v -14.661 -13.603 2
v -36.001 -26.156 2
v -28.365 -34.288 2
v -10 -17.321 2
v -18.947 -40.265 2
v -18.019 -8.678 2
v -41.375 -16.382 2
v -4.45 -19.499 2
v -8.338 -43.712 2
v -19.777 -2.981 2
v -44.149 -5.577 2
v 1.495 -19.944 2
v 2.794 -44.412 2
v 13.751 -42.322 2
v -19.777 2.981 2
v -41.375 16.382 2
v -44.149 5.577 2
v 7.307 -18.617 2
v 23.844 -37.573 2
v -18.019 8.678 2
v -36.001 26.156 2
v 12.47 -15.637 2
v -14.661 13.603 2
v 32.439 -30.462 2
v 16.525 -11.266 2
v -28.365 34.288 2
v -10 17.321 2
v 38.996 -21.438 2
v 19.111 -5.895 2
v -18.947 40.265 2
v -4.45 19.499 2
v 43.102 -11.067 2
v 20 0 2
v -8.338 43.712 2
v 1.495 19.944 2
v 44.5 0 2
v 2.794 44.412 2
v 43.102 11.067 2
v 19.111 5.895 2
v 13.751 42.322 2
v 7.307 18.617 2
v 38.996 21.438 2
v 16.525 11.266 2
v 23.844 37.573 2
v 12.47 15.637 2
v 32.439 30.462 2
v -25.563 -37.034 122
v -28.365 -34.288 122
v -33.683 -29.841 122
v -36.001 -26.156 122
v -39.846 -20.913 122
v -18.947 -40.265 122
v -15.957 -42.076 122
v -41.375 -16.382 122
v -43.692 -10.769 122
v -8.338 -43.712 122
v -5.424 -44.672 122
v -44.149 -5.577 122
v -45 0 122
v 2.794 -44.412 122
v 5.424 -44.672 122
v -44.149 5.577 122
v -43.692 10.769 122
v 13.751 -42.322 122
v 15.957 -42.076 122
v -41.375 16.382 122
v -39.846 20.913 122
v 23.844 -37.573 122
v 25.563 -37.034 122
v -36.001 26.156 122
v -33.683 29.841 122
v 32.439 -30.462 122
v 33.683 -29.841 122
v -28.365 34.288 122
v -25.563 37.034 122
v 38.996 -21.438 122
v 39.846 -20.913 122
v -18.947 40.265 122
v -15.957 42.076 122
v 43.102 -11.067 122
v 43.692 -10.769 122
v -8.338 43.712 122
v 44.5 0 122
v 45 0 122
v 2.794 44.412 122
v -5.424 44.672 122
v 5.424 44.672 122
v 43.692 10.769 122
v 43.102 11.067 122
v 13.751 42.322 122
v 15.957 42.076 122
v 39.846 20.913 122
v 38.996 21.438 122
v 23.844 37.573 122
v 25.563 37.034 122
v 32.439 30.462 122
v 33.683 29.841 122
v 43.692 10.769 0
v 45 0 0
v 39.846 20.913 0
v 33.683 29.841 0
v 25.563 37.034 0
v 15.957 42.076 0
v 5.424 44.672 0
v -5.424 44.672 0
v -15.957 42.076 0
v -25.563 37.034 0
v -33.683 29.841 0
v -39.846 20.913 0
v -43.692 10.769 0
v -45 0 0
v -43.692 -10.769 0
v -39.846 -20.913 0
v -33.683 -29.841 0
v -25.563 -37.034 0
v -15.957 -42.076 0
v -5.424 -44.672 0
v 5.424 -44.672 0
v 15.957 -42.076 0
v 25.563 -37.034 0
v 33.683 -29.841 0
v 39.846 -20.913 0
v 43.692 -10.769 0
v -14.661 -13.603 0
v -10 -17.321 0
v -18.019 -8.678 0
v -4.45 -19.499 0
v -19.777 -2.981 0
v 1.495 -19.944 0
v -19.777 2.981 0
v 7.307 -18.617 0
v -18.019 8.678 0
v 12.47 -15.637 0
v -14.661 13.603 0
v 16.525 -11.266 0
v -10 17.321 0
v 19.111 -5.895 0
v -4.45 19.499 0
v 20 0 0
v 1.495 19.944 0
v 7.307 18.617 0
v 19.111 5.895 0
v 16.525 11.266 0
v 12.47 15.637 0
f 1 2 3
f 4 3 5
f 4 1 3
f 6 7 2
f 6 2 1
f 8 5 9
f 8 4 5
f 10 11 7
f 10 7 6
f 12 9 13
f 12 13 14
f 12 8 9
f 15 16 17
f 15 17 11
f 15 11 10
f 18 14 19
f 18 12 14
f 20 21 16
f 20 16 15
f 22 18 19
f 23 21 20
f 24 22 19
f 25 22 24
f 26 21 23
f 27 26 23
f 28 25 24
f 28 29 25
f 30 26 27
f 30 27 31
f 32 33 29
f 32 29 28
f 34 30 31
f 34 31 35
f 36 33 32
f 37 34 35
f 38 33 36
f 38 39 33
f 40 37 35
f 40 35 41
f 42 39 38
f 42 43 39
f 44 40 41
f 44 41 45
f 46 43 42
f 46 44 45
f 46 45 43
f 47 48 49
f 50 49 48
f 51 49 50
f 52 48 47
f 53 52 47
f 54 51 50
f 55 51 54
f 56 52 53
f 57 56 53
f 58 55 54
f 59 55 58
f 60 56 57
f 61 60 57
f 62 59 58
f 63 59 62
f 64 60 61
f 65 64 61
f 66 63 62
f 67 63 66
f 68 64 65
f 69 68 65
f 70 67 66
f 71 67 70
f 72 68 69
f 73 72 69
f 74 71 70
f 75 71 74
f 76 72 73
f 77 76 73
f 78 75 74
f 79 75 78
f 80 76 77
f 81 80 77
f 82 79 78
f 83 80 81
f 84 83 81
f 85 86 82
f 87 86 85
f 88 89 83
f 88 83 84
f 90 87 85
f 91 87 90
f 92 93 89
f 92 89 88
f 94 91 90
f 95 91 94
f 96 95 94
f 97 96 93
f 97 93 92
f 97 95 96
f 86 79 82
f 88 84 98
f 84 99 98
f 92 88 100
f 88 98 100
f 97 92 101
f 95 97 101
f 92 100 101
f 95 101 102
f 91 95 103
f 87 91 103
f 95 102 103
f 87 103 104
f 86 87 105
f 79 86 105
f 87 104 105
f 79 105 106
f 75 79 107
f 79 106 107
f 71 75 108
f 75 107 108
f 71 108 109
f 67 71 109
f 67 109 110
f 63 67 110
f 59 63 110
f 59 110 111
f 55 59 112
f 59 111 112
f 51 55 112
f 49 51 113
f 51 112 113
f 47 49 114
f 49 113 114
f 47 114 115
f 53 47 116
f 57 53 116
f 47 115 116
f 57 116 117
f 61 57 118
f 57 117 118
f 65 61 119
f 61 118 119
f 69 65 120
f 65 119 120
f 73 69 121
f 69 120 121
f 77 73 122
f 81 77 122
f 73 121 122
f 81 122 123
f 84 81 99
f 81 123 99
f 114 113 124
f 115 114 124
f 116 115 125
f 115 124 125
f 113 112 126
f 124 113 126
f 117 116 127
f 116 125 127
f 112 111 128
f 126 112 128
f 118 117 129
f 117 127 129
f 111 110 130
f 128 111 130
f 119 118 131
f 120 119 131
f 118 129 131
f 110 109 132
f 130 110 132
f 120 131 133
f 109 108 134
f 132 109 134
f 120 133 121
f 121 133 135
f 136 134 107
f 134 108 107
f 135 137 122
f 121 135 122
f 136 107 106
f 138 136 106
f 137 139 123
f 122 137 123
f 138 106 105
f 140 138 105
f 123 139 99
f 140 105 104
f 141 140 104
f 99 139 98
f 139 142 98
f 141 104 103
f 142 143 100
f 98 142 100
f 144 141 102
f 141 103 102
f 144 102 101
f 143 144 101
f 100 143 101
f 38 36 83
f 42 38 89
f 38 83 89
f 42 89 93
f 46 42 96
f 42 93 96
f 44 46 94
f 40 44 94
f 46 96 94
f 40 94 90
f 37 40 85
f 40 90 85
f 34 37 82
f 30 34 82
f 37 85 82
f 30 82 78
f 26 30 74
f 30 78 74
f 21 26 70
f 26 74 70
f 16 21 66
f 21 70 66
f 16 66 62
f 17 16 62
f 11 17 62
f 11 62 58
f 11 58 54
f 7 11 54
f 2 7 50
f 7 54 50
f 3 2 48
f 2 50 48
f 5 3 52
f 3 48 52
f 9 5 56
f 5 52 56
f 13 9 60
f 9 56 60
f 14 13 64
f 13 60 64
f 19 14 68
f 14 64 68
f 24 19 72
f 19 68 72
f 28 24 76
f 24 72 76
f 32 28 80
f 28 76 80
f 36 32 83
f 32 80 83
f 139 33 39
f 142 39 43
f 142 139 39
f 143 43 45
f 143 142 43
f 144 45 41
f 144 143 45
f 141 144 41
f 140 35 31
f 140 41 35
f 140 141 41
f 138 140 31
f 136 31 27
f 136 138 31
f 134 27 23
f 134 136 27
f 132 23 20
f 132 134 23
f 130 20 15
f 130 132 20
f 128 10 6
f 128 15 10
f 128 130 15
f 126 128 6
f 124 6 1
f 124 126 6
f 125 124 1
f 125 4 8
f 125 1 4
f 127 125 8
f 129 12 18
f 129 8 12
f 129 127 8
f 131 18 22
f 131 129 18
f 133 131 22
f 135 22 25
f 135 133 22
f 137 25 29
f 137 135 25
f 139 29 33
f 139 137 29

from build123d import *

# Parameters (mm, degrees)
F0_R        = 45
F0_R_2      = 20
F1_DEPTH    = 2
F1_FACE_R   = 45
F1_FACE_R_2 = 20
F2_DEPTH    = 120
F3_R        = 44.5
F4_DEPTH    = 120


with BuildPart() as f1:
    # F0 (on Top) → F1 (new body)
    with BuildSketch(Plane.XY):
        Circle(F0_R)
        Circle(F0_R_2, mode=Mode.SUBTRACT)
    extrude(amount=F1_DEPTH)

    # F1_face (on face) → F2 (join)
    with BuildSketch(Plane.XY.offset(2)):
        Circle(F1_FACE_R)
        Circle(F1_FACE_R_2, mode=Mode.SUBTRACT)
    extrude(amount=F2_DEPTH)

    # F3 (on face) → F4 (cut)
    with BuildSketch(Plane.XY.offset(122)):
        Circle(F3_R)
    extrude(amount=-F4_DEPTH, mode=Mode.SUBTRACT)


solid = f1.part
